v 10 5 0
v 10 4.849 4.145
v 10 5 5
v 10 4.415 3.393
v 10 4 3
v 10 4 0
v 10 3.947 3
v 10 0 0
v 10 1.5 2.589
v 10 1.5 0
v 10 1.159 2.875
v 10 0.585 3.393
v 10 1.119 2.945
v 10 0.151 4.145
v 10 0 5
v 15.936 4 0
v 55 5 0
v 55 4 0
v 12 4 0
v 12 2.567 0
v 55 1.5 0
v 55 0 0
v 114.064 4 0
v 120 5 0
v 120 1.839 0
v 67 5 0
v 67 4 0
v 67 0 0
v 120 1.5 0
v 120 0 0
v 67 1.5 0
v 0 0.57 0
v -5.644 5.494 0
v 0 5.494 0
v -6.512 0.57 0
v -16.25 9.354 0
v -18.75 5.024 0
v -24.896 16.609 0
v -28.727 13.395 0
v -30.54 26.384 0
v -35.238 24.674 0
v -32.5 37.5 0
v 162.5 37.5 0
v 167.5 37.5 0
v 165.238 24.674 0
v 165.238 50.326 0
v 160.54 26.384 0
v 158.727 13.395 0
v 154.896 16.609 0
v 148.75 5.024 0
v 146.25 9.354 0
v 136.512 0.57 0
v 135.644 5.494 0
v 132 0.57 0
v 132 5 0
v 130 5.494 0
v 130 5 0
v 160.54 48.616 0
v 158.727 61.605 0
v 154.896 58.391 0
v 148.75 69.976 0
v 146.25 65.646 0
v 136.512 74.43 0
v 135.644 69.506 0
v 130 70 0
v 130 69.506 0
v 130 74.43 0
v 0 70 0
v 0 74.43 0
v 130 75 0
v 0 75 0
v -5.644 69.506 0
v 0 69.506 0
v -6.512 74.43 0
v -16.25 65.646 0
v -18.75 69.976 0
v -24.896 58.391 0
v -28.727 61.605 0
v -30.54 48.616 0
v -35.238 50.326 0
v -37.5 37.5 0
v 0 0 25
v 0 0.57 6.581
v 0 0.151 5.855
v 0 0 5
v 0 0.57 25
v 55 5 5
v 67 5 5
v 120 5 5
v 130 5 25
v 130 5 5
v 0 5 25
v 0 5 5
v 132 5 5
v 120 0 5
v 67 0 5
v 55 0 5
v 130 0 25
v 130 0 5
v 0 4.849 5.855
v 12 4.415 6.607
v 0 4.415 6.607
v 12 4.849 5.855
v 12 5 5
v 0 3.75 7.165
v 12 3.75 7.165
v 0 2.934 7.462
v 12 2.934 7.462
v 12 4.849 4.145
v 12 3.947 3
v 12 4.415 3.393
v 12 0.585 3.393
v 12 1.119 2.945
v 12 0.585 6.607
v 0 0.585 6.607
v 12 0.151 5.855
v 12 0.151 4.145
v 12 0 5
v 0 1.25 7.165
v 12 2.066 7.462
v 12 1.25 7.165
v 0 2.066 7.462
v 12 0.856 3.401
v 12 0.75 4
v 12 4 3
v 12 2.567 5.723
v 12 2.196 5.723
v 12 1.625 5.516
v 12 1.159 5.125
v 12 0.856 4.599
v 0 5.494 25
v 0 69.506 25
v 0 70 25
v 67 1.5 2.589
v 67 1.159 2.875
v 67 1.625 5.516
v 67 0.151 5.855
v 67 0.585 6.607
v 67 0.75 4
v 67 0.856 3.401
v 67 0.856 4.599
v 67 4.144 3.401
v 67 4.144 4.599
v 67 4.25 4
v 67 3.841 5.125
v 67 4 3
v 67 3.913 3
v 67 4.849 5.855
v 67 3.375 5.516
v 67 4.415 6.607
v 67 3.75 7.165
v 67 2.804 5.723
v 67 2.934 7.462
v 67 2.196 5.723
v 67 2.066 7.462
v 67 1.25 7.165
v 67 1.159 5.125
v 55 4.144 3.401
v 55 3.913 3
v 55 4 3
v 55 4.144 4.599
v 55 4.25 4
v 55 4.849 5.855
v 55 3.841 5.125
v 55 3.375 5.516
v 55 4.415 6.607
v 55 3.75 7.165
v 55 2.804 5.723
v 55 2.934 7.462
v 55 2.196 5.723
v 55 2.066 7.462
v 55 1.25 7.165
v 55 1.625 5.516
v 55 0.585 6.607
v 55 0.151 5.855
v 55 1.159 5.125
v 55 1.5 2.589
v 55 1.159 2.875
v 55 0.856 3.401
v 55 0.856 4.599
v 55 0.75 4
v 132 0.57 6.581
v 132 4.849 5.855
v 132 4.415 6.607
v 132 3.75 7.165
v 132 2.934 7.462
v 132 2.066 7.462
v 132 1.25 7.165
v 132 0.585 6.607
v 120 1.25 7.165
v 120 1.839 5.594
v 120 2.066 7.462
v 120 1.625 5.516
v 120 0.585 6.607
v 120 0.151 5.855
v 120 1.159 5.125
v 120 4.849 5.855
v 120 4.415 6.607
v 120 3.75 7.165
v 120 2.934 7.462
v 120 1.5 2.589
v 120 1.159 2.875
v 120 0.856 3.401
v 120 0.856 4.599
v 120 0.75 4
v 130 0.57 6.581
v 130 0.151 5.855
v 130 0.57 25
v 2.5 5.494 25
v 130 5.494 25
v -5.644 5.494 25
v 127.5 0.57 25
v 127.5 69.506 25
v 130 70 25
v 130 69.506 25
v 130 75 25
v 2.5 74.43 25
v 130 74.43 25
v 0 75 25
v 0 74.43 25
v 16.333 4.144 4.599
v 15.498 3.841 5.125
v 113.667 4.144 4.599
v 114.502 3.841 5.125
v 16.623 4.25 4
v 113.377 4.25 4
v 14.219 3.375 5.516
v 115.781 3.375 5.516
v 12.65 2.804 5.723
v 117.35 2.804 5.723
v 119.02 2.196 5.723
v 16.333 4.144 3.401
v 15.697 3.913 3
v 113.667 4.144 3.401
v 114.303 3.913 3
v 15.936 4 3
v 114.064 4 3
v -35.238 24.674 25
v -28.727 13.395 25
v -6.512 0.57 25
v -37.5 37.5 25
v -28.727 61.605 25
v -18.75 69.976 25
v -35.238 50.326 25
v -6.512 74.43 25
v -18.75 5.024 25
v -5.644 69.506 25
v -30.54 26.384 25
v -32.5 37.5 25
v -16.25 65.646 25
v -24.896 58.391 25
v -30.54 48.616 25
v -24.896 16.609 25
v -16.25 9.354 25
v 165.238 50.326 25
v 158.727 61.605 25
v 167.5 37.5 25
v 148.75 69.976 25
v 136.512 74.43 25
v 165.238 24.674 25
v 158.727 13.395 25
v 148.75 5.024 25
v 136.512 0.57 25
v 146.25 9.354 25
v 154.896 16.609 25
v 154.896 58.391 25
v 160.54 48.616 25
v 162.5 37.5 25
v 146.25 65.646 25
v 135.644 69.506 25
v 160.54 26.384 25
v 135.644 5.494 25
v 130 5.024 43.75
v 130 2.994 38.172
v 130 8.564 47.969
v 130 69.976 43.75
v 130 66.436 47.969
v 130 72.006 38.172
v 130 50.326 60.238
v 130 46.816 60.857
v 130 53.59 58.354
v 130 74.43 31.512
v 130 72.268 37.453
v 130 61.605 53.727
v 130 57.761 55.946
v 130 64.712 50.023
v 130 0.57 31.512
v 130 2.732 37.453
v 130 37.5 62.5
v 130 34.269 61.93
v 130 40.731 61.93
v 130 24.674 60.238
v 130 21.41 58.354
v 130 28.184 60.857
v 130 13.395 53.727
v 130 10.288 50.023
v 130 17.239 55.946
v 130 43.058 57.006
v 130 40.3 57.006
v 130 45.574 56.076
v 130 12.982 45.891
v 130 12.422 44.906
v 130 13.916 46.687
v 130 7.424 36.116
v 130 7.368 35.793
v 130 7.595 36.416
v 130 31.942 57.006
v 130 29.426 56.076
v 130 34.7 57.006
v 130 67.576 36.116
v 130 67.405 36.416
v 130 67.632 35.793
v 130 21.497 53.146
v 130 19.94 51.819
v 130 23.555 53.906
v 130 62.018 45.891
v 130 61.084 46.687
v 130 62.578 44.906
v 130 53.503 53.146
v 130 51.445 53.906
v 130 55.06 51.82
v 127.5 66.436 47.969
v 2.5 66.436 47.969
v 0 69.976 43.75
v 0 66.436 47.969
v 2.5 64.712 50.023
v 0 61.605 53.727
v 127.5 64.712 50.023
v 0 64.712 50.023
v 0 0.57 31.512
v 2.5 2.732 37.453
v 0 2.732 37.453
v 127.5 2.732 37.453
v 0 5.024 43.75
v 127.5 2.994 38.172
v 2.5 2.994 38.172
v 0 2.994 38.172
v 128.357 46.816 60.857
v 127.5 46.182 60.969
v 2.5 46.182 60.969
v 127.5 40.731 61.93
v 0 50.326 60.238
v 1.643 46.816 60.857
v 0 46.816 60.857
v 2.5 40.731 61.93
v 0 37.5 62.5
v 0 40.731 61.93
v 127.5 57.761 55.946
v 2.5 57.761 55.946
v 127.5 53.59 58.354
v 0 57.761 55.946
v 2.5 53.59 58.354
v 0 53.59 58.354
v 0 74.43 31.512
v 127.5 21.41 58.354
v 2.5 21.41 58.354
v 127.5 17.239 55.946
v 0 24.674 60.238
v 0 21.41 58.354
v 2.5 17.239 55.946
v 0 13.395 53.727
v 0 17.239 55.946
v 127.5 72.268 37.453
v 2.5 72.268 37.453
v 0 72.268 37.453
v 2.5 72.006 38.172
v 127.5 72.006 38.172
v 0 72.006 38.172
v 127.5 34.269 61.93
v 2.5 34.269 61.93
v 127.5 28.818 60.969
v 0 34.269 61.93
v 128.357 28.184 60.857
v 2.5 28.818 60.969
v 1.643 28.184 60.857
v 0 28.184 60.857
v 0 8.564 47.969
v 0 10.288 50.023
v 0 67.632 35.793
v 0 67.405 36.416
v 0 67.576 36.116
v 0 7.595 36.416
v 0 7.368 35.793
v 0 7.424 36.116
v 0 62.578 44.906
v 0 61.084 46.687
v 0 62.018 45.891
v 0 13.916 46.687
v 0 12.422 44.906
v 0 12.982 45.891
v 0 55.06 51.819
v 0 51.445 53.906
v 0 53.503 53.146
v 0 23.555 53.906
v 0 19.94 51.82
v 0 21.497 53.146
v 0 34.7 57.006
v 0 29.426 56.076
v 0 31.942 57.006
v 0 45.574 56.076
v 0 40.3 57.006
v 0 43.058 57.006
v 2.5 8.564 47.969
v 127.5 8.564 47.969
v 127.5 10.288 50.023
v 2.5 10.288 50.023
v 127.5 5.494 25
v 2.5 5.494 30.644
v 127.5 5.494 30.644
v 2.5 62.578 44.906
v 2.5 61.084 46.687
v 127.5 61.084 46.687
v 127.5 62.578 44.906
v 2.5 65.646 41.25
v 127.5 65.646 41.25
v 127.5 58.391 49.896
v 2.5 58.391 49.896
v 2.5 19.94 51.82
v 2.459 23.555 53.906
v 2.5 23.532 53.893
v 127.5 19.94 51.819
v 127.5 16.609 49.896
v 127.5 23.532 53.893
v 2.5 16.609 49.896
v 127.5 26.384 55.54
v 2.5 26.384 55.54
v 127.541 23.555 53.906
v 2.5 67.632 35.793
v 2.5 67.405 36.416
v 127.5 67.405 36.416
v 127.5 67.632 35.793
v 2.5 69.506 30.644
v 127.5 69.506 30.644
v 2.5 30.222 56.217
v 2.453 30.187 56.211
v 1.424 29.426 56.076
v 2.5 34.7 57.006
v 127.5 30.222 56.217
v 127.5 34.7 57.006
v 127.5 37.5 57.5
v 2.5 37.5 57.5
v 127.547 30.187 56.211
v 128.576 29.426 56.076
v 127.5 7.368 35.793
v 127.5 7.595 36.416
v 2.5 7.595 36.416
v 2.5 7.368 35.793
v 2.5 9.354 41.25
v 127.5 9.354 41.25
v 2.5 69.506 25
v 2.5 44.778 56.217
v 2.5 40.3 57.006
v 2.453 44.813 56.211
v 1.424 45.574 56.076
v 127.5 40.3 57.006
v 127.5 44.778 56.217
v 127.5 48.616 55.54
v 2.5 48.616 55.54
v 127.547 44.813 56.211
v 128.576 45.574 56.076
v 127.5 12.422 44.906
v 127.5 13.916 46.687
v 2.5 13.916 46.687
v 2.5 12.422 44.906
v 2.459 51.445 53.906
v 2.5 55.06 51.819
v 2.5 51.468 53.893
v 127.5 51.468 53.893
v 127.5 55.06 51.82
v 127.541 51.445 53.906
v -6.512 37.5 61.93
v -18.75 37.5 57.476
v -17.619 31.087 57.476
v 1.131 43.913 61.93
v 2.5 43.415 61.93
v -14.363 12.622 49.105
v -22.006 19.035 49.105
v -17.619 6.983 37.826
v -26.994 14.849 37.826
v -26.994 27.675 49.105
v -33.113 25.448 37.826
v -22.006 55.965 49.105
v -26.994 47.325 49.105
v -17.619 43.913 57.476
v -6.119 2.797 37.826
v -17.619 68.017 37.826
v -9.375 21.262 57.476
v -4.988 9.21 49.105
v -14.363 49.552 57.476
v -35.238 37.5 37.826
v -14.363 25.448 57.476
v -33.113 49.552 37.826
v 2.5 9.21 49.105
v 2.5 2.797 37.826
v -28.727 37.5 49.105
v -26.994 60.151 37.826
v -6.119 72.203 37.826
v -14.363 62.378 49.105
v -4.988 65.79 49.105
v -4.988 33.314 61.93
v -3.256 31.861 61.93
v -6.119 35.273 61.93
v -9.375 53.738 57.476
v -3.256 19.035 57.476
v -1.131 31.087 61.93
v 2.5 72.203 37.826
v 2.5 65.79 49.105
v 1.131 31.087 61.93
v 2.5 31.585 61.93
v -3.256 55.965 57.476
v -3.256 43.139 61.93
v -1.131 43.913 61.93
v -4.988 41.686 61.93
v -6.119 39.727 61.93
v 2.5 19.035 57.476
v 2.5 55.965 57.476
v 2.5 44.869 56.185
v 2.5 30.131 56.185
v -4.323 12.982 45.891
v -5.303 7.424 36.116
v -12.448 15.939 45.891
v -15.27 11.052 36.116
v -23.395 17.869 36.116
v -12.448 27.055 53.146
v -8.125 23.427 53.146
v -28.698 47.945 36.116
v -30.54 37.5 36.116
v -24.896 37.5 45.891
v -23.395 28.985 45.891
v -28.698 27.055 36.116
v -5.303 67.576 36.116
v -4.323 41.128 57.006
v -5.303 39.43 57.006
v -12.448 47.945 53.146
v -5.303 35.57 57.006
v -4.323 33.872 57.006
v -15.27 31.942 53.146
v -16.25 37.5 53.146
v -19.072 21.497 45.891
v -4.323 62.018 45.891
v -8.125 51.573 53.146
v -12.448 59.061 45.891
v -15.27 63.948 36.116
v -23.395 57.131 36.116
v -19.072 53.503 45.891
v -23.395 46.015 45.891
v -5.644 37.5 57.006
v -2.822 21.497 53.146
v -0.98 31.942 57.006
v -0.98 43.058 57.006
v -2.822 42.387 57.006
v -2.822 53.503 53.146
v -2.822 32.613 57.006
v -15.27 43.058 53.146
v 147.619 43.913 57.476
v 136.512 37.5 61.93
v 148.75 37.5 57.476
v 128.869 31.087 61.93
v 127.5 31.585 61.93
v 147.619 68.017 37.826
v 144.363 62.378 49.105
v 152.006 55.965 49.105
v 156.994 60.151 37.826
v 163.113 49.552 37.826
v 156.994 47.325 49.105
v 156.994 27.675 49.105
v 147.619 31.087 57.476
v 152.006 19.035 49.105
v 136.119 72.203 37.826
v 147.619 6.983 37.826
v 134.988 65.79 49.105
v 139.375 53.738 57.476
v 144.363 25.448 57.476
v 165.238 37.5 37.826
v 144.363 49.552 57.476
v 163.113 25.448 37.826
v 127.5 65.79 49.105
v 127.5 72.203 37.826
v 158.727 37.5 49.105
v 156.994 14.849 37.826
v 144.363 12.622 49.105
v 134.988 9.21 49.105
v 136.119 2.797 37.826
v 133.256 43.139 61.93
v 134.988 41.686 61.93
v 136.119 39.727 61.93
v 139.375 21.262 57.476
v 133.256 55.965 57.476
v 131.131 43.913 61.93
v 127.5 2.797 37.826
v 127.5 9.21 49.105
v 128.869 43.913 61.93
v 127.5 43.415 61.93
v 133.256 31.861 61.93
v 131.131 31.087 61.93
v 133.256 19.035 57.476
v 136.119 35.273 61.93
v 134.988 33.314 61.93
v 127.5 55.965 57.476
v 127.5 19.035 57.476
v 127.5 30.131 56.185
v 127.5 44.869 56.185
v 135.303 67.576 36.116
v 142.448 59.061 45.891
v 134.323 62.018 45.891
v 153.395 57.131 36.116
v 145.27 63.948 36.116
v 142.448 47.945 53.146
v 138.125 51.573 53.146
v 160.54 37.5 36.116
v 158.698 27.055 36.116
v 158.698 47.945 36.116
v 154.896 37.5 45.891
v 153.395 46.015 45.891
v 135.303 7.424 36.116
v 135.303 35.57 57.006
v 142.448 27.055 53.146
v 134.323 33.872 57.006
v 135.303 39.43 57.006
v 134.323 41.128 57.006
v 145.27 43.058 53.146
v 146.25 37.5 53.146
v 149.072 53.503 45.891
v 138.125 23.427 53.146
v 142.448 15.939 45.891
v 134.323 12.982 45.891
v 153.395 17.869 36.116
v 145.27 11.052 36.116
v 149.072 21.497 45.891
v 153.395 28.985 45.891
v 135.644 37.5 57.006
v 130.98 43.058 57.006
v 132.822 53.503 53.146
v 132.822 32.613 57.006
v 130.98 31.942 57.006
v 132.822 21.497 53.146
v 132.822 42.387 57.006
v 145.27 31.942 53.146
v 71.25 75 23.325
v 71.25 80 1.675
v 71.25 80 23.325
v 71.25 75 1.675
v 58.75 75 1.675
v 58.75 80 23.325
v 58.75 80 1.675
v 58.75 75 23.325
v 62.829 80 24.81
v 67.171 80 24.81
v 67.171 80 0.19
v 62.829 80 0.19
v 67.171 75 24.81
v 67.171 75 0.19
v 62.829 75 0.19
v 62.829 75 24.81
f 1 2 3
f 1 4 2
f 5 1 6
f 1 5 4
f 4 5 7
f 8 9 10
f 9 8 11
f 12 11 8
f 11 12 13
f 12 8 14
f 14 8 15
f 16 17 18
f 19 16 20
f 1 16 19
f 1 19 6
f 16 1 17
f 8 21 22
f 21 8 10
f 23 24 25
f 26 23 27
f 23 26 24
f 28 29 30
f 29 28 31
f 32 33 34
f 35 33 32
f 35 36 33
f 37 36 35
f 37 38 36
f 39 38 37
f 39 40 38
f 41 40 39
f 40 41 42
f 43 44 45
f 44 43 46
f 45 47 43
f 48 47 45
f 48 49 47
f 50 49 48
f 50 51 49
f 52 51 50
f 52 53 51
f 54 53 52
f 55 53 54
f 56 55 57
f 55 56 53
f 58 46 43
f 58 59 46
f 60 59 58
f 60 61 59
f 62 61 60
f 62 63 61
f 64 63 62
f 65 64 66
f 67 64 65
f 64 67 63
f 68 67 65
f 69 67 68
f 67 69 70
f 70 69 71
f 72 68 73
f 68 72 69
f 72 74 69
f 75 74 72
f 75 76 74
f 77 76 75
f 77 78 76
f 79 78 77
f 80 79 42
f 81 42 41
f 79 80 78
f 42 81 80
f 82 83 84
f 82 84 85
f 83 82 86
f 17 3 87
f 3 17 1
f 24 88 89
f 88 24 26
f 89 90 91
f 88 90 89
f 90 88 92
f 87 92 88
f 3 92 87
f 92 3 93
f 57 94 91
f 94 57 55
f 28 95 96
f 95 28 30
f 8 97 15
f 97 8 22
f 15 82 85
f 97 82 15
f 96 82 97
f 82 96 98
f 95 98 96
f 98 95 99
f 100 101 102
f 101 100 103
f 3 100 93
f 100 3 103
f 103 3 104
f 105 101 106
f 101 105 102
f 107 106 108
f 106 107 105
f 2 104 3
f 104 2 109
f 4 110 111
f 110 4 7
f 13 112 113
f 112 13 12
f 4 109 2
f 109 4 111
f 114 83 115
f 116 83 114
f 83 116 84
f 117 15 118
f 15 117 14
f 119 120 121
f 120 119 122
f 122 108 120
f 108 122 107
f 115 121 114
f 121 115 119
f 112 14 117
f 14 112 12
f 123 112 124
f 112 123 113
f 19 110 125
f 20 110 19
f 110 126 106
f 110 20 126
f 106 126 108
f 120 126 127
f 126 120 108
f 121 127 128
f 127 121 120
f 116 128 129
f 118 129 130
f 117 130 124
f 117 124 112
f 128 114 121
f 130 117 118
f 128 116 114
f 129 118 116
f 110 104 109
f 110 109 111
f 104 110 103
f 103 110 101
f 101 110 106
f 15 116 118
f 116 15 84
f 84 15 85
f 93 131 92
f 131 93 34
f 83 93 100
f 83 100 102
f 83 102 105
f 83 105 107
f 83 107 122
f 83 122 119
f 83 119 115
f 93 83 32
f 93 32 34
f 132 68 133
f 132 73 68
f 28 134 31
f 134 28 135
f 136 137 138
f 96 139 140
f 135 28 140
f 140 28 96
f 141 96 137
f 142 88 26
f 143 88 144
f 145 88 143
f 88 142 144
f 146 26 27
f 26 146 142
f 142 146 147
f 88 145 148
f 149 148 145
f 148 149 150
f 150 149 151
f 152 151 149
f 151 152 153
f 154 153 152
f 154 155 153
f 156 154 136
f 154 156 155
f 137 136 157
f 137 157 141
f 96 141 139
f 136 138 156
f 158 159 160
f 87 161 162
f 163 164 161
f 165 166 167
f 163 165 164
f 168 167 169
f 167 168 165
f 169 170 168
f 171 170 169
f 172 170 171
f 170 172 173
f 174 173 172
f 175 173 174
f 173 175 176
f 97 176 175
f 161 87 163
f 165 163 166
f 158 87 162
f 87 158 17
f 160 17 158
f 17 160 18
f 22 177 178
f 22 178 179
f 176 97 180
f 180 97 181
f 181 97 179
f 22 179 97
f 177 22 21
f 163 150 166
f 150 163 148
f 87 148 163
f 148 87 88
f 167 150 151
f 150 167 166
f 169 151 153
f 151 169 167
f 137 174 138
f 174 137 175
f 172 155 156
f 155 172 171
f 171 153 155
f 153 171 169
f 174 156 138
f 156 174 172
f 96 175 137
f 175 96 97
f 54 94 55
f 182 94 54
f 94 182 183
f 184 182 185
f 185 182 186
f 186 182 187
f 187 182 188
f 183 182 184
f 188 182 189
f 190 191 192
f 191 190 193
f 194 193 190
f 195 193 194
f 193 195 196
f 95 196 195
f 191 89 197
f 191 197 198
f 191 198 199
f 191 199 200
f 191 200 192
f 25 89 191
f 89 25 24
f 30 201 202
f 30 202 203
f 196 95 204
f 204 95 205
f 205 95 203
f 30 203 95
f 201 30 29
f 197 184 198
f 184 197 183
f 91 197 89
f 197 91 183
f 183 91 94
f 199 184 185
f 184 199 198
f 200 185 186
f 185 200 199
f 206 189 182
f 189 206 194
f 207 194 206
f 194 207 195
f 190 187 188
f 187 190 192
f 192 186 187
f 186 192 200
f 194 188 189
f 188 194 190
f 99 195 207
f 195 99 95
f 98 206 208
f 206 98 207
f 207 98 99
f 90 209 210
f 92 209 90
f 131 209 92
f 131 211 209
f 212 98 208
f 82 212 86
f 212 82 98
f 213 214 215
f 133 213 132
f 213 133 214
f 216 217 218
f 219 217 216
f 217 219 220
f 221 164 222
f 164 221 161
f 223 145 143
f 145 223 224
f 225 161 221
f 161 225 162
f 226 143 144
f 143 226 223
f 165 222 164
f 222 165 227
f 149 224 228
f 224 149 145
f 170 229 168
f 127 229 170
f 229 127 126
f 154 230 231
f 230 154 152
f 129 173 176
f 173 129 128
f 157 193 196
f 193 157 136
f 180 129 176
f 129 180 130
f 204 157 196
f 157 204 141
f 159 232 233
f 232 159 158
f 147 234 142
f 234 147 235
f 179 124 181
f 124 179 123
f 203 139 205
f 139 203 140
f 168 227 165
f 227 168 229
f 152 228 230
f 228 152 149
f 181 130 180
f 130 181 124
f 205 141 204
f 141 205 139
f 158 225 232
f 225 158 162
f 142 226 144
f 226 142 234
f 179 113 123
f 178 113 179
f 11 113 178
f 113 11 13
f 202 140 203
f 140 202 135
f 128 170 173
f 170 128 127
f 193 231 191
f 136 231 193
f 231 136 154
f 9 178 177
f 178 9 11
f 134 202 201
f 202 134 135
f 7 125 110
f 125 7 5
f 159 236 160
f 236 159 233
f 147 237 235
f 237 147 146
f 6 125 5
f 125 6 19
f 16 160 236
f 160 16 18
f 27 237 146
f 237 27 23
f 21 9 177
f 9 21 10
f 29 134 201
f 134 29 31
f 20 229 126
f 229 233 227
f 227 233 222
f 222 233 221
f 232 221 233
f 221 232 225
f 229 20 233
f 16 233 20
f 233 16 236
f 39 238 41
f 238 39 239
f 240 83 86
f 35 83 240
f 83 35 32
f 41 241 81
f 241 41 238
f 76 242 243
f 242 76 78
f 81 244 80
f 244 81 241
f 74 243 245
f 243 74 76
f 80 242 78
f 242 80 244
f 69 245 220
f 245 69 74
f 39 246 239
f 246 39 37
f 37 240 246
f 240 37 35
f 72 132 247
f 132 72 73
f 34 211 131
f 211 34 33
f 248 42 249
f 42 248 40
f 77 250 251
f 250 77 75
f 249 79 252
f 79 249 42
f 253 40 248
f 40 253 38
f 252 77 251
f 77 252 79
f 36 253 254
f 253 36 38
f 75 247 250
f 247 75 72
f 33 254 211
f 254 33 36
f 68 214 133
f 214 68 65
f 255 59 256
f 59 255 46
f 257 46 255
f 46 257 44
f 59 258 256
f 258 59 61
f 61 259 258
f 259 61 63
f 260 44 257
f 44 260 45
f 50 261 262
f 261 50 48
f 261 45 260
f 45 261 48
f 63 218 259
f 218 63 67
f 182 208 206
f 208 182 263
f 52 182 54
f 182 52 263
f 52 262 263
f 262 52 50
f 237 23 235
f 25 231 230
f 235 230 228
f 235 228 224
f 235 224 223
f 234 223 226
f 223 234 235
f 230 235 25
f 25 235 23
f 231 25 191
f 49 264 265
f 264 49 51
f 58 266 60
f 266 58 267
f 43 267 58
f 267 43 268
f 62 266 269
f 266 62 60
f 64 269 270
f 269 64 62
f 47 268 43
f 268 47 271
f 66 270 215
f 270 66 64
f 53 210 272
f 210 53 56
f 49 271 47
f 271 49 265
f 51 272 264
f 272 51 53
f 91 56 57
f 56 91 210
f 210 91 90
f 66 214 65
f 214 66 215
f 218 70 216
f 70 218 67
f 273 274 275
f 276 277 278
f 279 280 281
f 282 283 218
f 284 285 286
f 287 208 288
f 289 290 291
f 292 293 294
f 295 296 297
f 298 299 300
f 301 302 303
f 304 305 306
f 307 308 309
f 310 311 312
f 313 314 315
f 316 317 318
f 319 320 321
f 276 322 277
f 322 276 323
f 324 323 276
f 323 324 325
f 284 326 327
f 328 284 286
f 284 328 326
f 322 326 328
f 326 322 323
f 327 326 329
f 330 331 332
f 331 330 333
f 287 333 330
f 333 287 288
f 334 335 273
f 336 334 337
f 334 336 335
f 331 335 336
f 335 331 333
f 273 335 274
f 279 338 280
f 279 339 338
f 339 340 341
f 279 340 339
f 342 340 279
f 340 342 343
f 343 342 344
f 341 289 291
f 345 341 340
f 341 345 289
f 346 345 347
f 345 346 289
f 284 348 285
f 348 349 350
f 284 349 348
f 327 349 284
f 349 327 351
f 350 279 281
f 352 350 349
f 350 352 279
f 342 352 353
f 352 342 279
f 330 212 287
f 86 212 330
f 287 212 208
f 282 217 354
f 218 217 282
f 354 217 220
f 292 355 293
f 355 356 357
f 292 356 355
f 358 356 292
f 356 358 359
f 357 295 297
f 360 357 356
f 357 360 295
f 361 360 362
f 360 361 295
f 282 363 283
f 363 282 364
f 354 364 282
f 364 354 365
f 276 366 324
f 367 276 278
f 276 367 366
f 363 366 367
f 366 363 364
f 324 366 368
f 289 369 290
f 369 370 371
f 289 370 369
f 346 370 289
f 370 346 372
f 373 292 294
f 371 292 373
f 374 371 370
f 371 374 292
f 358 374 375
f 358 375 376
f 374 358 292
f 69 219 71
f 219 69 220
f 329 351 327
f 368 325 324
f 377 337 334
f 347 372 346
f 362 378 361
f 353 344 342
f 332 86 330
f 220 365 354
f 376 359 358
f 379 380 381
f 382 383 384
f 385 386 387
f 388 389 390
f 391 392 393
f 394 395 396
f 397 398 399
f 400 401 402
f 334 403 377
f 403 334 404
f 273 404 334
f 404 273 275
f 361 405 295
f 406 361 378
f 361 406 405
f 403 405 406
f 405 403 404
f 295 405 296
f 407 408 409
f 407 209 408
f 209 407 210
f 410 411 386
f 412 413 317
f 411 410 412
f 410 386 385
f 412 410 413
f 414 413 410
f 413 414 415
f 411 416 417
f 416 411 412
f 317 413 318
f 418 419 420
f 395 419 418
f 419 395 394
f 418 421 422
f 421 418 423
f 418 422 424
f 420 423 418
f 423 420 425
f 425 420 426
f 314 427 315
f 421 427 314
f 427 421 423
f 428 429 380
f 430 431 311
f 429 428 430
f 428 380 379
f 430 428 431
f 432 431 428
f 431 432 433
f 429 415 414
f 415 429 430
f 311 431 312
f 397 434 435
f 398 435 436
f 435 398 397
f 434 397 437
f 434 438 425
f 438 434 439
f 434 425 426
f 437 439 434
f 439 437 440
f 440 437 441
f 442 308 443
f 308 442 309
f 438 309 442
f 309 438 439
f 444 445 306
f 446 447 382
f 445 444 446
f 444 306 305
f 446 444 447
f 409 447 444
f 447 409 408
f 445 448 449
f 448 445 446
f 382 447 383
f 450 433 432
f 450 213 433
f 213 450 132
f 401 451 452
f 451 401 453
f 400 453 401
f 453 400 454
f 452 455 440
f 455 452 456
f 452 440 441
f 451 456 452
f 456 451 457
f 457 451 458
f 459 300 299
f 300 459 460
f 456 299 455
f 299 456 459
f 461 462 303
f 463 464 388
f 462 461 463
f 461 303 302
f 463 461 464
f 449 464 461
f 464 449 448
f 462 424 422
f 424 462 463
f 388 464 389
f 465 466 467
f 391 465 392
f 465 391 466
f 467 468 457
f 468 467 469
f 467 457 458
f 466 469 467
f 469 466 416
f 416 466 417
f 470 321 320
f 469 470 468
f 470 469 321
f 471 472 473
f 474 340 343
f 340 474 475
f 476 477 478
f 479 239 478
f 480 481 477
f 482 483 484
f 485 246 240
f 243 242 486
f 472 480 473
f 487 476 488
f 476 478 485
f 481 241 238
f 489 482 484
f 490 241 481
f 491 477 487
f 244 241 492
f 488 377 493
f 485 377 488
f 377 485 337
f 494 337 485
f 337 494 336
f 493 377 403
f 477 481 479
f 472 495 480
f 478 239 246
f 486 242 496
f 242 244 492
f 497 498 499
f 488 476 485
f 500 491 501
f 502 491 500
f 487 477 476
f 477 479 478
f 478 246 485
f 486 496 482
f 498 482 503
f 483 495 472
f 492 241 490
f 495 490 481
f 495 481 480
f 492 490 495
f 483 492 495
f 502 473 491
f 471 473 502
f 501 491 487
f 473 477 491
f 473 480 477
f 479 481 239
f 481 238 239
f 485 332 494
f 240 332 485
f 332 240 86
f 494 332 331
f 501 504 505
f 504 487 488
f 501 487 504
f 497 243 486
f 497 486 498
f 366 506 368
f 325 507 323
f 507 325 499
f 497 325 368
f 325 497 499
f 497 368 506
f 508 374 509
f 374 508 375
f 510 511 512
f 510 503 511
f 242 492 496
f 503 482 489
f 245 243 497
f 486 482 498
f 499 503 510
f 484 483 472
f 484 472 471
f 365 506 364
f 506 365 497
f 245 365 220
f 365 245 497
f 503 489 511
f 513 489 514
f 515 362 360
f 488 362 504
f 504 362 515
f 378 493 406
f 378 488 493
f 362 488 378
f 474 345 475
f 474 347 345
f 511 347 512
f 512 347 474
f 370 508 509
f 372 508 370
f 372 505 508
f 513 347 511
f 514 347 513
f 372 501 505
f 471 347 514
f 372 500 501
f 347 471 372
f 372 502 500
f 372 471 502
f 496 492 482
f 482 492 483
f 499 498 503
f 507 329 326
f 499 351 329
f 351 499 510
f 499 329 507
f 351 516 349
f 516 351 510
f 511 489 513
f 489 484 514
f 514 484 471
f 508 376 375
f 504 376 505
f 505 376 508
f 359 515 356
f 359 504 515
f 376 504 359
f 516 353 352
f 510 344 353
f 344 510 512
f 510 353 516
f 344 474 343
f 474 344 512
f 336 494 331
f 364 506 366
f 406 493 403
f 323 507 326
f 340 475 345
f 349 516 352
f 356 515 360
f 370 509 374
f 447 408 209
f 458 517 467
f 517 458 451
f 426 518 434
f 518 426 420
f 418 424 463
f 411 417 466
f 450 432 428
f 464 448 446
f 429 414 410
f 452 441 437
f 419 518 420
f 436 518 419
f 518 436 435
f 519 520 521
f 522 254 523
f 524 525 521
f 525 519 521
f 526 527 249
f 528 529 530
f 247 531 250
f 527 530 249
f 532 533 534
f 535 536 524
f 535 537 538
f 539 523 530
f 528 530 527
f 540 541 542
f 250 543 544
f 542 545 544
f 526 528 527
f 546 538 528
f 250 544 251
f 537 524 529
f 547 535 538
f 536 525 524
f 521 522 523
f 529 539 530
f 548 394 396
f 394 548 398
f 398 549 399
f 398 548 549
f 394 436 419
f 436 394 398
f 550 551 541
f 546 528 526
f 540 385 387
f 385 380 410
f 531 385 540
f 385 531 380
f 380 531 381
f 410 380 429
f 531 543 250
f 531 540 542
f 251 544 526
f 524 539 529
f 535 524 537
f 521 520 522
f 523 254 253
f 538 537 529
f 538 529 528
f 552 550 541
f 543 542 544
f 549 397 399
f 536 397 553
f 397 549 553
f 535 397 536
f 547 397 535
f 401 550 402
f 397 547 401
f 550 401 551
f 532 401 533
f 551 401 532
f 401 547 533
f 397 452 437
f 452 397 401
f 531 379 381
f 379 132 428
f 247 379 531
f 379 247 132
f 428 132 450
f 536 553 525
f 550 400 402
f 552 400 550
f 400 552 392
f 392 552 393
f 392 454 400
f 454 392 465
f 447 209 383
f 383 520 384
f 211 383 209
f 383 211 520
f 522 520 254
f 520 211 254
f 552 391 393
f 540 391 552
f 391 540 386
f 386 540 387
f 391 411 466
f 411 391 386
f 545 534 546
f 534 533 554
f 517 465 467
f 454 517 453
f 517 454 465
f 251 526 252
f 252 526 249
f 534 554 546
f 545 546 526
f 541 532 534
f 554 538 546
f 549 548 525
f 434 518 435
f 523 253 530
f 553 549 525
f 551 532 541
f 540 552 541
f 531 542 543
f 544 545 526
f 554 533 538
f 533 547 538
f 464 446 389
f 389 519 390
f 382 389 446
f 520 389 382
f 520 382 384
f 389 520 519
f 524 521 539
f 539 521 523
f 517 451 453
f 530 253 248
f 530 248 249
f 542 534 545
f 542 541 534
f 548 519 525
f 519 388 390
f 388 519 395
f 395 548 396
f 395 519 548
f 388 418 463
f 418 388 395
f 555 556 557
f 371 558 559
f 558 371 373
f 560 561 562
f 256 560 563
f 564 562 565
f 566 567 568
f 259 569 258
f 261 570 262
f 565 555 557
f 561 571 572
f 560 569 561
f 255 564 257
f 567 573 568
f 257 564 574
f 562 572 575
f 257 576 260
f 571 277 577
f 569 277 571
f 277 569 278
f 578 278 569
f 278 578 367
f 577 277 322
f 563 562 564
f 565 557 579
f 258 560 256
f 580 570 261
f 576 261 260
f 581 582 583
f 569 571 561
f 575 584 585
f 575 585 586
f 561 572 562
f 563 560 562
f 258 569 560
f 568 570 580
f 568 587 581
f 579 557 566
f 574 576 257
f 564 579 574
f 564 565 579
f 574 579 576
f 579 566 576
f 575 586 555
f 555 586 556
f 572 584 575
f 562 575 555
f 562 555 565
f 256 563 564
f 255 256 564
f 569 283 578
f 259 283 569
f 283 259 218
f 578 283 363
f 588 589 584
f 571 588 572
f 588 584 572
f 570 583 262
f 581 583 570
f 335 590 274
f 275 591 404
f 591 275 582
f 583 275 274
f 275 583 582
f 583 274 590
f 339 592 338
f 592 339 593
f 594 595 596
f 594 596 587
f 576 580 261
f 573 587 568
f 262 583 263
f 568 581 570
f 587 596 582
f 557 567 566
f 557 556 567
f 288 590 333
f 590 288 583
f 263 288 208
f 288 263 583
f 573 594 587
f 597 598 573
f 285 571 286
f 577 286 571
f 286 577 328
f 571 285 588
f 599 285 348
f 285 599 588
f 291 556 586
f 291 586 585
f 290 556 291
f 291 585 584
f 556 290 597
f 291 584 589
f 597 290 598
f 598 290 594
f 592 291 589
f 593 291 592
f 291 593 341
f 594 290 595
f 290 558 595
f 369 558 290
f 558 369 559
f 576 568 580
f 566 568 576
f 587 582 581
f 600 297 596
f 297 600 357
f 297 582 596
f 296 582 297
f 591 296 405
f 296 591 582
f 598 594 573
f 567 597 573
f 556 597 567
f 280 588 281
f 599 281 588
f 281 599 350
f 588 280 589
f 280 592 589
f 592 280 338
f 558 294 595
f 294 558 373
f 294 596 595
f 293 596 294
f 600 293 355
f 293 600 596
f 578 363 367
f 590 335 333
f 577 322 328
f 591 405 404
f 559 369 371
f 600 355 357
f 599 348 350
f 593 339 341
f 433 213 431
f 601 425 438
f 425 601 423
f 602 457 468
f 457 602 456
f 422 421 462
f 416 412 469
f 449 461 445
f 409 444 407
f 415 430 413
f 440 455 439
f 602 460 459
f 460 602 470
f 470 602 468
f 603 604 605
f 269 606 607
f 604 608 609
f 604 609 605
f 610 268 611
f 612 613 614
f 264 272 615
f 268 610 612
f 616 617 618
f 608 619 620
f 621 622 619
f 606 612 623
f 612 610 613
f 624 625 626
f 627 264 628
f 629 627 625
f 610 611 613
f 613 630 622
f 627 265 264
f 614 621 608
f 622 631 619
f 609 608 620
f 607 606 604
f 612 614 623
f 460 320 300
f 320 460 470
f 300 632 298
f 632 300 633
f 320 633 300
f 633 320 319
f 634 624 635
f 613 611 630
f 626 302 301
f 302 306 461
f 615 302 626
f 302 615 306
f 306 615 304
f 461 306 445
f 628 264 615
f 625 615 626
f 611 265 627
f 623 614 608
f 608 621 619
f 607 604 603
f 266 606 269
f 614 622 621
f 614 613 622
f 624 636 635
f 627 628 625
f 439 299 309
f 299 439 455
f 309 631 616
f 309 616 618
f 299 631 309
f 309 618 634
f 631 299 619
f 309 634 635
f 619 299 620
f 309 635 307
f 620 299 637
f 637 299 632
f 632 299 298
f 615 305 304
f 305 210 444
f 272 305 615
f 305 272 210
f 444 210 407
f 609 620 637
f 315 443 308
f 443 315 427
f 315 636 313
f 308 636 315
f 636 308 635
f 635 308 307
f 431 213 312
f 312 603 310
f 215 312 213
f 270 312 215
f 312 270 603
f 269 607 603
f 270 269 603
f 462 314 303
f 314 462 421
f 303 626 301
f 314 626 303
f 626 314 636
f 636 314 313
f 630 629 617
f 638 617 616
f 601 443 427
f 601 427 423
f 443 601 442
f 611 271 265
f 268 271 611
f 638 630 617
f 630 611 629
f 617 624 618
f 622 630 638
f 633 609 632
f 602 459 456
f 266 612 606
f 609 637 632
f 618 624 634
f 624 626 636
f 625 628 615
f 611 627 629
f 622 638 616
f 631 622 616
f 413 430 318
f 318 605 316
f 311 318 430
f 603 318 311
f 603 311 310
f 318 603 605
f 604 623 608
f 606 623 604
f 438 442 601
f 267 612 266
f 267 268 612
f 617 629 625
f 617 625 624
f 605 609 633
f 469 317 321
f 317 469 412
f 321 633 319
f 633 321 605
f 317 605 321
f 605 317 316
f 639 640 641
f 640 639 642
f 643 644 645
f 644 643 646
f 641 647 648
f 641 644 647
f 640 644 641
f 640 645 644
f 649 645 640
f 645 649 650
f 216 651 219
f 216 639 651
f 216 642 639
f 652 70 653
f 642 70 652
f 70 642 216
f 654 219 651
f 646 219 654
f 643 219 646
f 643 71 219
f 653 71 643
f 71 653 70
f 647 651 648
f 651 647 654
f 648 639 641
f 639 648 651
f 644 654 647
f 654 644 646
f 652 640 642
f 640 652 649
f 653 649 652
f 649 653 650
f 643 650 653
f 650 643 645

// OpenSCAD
$fn=18.5;
hcoffre= 25;
lcoffrex= 130;
llamey= 5;
lcoffrey=70;


module head(coffrex,coffrey,coffrez){

	difference(){union(){difference(){cube([coffrex,llamey,coffrez]) ;
union(){union() {translate([0,0,0])cube([10,llamey,5]) ;

rotate([90,0,90])translate([llamey/2,llamey,0])cylinder(h=12,r=llamey/2) ;}


translate([lcoffrex/2-10,0,0])union() {translate([0,0,0])cube([12,llamey,5]) ;

rotate([90,0,90])translate([llamey/2,llamey,0])cylinder(h=12,r=llamey/2) ;}


translate([lcoffrex-10,0,0])union() {translate([0,0,0])cube([12,llamey,5]) ;

rotate([90,0,90])translate([llamey/2,llamey,0])cylinder(h=12,r=llamey/2) ;}}}}translate([0,llamey/2,4])rotate([90,0,90])cylinder(h=lcoffrex,r=llamey/4+0.5);translate([0,1.5,0])cube([lcoffrex,2.5,3]);}


translate([0,lcoffrey,0])cube([coffrex,llamey,coffrez]) ;

difference(){	union(){difference(){translate([0,lcoffrey/2+llamey/2,0])cylinder(h=hcoffre,r=lcoffrey/2+llamey/2);
translate([0,lcoffrey/2+llamey/2,0])cylinder(h=hcoffre,r=lcoffrey/2-llamey/2) ;translate([0,llamey,0])cube([lcoffrex/2-15,lcoffrey-llamey,hcoffre]); }}union() {translate([0,0,0])cube([12,llamey,5]) ;

rotate([90,0,90])translate([llamey/2,llamey,0])cylinder(h=12,r=llamey/2) ;}}

difference(){	union(){difference(){translate([lcoffrex,lcoffrey/2+llamey/2,0])cylinder(h=hcoffre,r=lcoffrey/2+llamey/2) ;
translate([lcoffrex,lcoffrey/2+llamey/2,0])cylinder(h=hcoffre,r=lcoffrey/2-llamey/2) ;translate([lcoffrex/2,llamey,0])cube([lcoffrex/2,lcoffrey-llamey,hcoffre]); }}union(){translate([lcoffrex-10,0,0])union() {translate([0,0,0])cube([12,llamey,5]) ;

rotate([90,0,90])translate([llamey/2,llamey,0])cylinder(h=12,r=llamey/2) ;}}}

translate([0,lcoffrey/2+llamey/2,hcoffre])rotate([0,90,0])difference(){cylinder(h=lcoffrex,r=lcoffrey/2+llamey/2);cylinder(h=lcoffrex,r=lcoffrey/2-llamey/2);translate([0,-lcoffrey/2+llamey/2,0])cube([lcoffrey/2+5,lcoffrey-llamey,lcoffrex]);}

translate([llamey/2,0,hcoffre])translate([0,lcoffrey+llamey])rotate([0,0,180])translate([-lcoffrey/2,0,-lcoffrey])difference(){translate([lcoffrey/2+llamey/2,lcoffrey/2+llamey/2,lcoffrey])sphere(d=lcoffrey+llamey);cube([lcoffrey+llamey,lcoffrey+llamey,lcoffrey]);cube([lcoffrey/2,lcoffrey+llamey,lcoffrey+lcoffrey/2+llamey]);translate([lcoffrey/2+llamey/2,lcoffrey/2+llamey/2,lcoffrey])sphere(d=lcoffrey-llamey);}

translate([lcoffrex-llamey/2,0,hcoffre])translate([-lcoffrey/2,0,-lcoffrey])difference(){translate([lcoffrey/2+llamey/2,lcoffrey/2+llamey/2,lcoffrey])sphere(d=lcoffrey+llamey);cube([lcoffrey+llamey,lcoffrey+llamey,lcoffrey]);cube([lcoffrey/2,lcoffrey+llamey,lcoffrey+lcoffrey/2+llamey]);translate([lcoffrey/2+llamey/2,lcoffrey/2+llamey/2,lcoffrey])sphere(d=lcoffrey-llamey);}

intersection(){translate([lcoffrex/2-hcoffre/4,lcoffrey+llamey,0])cube([hcoffre/2,llamey,hcoffre]);
translate([lcoffrex/2,lcoffrey+llamey+llamey,hcoffre/2])rotate([90,0,0])cylinder(h=llamey,r=hcoffre/2);}
}

translate([0,0,0])head(lcoffrex,lcoffrey,hcoffre);
